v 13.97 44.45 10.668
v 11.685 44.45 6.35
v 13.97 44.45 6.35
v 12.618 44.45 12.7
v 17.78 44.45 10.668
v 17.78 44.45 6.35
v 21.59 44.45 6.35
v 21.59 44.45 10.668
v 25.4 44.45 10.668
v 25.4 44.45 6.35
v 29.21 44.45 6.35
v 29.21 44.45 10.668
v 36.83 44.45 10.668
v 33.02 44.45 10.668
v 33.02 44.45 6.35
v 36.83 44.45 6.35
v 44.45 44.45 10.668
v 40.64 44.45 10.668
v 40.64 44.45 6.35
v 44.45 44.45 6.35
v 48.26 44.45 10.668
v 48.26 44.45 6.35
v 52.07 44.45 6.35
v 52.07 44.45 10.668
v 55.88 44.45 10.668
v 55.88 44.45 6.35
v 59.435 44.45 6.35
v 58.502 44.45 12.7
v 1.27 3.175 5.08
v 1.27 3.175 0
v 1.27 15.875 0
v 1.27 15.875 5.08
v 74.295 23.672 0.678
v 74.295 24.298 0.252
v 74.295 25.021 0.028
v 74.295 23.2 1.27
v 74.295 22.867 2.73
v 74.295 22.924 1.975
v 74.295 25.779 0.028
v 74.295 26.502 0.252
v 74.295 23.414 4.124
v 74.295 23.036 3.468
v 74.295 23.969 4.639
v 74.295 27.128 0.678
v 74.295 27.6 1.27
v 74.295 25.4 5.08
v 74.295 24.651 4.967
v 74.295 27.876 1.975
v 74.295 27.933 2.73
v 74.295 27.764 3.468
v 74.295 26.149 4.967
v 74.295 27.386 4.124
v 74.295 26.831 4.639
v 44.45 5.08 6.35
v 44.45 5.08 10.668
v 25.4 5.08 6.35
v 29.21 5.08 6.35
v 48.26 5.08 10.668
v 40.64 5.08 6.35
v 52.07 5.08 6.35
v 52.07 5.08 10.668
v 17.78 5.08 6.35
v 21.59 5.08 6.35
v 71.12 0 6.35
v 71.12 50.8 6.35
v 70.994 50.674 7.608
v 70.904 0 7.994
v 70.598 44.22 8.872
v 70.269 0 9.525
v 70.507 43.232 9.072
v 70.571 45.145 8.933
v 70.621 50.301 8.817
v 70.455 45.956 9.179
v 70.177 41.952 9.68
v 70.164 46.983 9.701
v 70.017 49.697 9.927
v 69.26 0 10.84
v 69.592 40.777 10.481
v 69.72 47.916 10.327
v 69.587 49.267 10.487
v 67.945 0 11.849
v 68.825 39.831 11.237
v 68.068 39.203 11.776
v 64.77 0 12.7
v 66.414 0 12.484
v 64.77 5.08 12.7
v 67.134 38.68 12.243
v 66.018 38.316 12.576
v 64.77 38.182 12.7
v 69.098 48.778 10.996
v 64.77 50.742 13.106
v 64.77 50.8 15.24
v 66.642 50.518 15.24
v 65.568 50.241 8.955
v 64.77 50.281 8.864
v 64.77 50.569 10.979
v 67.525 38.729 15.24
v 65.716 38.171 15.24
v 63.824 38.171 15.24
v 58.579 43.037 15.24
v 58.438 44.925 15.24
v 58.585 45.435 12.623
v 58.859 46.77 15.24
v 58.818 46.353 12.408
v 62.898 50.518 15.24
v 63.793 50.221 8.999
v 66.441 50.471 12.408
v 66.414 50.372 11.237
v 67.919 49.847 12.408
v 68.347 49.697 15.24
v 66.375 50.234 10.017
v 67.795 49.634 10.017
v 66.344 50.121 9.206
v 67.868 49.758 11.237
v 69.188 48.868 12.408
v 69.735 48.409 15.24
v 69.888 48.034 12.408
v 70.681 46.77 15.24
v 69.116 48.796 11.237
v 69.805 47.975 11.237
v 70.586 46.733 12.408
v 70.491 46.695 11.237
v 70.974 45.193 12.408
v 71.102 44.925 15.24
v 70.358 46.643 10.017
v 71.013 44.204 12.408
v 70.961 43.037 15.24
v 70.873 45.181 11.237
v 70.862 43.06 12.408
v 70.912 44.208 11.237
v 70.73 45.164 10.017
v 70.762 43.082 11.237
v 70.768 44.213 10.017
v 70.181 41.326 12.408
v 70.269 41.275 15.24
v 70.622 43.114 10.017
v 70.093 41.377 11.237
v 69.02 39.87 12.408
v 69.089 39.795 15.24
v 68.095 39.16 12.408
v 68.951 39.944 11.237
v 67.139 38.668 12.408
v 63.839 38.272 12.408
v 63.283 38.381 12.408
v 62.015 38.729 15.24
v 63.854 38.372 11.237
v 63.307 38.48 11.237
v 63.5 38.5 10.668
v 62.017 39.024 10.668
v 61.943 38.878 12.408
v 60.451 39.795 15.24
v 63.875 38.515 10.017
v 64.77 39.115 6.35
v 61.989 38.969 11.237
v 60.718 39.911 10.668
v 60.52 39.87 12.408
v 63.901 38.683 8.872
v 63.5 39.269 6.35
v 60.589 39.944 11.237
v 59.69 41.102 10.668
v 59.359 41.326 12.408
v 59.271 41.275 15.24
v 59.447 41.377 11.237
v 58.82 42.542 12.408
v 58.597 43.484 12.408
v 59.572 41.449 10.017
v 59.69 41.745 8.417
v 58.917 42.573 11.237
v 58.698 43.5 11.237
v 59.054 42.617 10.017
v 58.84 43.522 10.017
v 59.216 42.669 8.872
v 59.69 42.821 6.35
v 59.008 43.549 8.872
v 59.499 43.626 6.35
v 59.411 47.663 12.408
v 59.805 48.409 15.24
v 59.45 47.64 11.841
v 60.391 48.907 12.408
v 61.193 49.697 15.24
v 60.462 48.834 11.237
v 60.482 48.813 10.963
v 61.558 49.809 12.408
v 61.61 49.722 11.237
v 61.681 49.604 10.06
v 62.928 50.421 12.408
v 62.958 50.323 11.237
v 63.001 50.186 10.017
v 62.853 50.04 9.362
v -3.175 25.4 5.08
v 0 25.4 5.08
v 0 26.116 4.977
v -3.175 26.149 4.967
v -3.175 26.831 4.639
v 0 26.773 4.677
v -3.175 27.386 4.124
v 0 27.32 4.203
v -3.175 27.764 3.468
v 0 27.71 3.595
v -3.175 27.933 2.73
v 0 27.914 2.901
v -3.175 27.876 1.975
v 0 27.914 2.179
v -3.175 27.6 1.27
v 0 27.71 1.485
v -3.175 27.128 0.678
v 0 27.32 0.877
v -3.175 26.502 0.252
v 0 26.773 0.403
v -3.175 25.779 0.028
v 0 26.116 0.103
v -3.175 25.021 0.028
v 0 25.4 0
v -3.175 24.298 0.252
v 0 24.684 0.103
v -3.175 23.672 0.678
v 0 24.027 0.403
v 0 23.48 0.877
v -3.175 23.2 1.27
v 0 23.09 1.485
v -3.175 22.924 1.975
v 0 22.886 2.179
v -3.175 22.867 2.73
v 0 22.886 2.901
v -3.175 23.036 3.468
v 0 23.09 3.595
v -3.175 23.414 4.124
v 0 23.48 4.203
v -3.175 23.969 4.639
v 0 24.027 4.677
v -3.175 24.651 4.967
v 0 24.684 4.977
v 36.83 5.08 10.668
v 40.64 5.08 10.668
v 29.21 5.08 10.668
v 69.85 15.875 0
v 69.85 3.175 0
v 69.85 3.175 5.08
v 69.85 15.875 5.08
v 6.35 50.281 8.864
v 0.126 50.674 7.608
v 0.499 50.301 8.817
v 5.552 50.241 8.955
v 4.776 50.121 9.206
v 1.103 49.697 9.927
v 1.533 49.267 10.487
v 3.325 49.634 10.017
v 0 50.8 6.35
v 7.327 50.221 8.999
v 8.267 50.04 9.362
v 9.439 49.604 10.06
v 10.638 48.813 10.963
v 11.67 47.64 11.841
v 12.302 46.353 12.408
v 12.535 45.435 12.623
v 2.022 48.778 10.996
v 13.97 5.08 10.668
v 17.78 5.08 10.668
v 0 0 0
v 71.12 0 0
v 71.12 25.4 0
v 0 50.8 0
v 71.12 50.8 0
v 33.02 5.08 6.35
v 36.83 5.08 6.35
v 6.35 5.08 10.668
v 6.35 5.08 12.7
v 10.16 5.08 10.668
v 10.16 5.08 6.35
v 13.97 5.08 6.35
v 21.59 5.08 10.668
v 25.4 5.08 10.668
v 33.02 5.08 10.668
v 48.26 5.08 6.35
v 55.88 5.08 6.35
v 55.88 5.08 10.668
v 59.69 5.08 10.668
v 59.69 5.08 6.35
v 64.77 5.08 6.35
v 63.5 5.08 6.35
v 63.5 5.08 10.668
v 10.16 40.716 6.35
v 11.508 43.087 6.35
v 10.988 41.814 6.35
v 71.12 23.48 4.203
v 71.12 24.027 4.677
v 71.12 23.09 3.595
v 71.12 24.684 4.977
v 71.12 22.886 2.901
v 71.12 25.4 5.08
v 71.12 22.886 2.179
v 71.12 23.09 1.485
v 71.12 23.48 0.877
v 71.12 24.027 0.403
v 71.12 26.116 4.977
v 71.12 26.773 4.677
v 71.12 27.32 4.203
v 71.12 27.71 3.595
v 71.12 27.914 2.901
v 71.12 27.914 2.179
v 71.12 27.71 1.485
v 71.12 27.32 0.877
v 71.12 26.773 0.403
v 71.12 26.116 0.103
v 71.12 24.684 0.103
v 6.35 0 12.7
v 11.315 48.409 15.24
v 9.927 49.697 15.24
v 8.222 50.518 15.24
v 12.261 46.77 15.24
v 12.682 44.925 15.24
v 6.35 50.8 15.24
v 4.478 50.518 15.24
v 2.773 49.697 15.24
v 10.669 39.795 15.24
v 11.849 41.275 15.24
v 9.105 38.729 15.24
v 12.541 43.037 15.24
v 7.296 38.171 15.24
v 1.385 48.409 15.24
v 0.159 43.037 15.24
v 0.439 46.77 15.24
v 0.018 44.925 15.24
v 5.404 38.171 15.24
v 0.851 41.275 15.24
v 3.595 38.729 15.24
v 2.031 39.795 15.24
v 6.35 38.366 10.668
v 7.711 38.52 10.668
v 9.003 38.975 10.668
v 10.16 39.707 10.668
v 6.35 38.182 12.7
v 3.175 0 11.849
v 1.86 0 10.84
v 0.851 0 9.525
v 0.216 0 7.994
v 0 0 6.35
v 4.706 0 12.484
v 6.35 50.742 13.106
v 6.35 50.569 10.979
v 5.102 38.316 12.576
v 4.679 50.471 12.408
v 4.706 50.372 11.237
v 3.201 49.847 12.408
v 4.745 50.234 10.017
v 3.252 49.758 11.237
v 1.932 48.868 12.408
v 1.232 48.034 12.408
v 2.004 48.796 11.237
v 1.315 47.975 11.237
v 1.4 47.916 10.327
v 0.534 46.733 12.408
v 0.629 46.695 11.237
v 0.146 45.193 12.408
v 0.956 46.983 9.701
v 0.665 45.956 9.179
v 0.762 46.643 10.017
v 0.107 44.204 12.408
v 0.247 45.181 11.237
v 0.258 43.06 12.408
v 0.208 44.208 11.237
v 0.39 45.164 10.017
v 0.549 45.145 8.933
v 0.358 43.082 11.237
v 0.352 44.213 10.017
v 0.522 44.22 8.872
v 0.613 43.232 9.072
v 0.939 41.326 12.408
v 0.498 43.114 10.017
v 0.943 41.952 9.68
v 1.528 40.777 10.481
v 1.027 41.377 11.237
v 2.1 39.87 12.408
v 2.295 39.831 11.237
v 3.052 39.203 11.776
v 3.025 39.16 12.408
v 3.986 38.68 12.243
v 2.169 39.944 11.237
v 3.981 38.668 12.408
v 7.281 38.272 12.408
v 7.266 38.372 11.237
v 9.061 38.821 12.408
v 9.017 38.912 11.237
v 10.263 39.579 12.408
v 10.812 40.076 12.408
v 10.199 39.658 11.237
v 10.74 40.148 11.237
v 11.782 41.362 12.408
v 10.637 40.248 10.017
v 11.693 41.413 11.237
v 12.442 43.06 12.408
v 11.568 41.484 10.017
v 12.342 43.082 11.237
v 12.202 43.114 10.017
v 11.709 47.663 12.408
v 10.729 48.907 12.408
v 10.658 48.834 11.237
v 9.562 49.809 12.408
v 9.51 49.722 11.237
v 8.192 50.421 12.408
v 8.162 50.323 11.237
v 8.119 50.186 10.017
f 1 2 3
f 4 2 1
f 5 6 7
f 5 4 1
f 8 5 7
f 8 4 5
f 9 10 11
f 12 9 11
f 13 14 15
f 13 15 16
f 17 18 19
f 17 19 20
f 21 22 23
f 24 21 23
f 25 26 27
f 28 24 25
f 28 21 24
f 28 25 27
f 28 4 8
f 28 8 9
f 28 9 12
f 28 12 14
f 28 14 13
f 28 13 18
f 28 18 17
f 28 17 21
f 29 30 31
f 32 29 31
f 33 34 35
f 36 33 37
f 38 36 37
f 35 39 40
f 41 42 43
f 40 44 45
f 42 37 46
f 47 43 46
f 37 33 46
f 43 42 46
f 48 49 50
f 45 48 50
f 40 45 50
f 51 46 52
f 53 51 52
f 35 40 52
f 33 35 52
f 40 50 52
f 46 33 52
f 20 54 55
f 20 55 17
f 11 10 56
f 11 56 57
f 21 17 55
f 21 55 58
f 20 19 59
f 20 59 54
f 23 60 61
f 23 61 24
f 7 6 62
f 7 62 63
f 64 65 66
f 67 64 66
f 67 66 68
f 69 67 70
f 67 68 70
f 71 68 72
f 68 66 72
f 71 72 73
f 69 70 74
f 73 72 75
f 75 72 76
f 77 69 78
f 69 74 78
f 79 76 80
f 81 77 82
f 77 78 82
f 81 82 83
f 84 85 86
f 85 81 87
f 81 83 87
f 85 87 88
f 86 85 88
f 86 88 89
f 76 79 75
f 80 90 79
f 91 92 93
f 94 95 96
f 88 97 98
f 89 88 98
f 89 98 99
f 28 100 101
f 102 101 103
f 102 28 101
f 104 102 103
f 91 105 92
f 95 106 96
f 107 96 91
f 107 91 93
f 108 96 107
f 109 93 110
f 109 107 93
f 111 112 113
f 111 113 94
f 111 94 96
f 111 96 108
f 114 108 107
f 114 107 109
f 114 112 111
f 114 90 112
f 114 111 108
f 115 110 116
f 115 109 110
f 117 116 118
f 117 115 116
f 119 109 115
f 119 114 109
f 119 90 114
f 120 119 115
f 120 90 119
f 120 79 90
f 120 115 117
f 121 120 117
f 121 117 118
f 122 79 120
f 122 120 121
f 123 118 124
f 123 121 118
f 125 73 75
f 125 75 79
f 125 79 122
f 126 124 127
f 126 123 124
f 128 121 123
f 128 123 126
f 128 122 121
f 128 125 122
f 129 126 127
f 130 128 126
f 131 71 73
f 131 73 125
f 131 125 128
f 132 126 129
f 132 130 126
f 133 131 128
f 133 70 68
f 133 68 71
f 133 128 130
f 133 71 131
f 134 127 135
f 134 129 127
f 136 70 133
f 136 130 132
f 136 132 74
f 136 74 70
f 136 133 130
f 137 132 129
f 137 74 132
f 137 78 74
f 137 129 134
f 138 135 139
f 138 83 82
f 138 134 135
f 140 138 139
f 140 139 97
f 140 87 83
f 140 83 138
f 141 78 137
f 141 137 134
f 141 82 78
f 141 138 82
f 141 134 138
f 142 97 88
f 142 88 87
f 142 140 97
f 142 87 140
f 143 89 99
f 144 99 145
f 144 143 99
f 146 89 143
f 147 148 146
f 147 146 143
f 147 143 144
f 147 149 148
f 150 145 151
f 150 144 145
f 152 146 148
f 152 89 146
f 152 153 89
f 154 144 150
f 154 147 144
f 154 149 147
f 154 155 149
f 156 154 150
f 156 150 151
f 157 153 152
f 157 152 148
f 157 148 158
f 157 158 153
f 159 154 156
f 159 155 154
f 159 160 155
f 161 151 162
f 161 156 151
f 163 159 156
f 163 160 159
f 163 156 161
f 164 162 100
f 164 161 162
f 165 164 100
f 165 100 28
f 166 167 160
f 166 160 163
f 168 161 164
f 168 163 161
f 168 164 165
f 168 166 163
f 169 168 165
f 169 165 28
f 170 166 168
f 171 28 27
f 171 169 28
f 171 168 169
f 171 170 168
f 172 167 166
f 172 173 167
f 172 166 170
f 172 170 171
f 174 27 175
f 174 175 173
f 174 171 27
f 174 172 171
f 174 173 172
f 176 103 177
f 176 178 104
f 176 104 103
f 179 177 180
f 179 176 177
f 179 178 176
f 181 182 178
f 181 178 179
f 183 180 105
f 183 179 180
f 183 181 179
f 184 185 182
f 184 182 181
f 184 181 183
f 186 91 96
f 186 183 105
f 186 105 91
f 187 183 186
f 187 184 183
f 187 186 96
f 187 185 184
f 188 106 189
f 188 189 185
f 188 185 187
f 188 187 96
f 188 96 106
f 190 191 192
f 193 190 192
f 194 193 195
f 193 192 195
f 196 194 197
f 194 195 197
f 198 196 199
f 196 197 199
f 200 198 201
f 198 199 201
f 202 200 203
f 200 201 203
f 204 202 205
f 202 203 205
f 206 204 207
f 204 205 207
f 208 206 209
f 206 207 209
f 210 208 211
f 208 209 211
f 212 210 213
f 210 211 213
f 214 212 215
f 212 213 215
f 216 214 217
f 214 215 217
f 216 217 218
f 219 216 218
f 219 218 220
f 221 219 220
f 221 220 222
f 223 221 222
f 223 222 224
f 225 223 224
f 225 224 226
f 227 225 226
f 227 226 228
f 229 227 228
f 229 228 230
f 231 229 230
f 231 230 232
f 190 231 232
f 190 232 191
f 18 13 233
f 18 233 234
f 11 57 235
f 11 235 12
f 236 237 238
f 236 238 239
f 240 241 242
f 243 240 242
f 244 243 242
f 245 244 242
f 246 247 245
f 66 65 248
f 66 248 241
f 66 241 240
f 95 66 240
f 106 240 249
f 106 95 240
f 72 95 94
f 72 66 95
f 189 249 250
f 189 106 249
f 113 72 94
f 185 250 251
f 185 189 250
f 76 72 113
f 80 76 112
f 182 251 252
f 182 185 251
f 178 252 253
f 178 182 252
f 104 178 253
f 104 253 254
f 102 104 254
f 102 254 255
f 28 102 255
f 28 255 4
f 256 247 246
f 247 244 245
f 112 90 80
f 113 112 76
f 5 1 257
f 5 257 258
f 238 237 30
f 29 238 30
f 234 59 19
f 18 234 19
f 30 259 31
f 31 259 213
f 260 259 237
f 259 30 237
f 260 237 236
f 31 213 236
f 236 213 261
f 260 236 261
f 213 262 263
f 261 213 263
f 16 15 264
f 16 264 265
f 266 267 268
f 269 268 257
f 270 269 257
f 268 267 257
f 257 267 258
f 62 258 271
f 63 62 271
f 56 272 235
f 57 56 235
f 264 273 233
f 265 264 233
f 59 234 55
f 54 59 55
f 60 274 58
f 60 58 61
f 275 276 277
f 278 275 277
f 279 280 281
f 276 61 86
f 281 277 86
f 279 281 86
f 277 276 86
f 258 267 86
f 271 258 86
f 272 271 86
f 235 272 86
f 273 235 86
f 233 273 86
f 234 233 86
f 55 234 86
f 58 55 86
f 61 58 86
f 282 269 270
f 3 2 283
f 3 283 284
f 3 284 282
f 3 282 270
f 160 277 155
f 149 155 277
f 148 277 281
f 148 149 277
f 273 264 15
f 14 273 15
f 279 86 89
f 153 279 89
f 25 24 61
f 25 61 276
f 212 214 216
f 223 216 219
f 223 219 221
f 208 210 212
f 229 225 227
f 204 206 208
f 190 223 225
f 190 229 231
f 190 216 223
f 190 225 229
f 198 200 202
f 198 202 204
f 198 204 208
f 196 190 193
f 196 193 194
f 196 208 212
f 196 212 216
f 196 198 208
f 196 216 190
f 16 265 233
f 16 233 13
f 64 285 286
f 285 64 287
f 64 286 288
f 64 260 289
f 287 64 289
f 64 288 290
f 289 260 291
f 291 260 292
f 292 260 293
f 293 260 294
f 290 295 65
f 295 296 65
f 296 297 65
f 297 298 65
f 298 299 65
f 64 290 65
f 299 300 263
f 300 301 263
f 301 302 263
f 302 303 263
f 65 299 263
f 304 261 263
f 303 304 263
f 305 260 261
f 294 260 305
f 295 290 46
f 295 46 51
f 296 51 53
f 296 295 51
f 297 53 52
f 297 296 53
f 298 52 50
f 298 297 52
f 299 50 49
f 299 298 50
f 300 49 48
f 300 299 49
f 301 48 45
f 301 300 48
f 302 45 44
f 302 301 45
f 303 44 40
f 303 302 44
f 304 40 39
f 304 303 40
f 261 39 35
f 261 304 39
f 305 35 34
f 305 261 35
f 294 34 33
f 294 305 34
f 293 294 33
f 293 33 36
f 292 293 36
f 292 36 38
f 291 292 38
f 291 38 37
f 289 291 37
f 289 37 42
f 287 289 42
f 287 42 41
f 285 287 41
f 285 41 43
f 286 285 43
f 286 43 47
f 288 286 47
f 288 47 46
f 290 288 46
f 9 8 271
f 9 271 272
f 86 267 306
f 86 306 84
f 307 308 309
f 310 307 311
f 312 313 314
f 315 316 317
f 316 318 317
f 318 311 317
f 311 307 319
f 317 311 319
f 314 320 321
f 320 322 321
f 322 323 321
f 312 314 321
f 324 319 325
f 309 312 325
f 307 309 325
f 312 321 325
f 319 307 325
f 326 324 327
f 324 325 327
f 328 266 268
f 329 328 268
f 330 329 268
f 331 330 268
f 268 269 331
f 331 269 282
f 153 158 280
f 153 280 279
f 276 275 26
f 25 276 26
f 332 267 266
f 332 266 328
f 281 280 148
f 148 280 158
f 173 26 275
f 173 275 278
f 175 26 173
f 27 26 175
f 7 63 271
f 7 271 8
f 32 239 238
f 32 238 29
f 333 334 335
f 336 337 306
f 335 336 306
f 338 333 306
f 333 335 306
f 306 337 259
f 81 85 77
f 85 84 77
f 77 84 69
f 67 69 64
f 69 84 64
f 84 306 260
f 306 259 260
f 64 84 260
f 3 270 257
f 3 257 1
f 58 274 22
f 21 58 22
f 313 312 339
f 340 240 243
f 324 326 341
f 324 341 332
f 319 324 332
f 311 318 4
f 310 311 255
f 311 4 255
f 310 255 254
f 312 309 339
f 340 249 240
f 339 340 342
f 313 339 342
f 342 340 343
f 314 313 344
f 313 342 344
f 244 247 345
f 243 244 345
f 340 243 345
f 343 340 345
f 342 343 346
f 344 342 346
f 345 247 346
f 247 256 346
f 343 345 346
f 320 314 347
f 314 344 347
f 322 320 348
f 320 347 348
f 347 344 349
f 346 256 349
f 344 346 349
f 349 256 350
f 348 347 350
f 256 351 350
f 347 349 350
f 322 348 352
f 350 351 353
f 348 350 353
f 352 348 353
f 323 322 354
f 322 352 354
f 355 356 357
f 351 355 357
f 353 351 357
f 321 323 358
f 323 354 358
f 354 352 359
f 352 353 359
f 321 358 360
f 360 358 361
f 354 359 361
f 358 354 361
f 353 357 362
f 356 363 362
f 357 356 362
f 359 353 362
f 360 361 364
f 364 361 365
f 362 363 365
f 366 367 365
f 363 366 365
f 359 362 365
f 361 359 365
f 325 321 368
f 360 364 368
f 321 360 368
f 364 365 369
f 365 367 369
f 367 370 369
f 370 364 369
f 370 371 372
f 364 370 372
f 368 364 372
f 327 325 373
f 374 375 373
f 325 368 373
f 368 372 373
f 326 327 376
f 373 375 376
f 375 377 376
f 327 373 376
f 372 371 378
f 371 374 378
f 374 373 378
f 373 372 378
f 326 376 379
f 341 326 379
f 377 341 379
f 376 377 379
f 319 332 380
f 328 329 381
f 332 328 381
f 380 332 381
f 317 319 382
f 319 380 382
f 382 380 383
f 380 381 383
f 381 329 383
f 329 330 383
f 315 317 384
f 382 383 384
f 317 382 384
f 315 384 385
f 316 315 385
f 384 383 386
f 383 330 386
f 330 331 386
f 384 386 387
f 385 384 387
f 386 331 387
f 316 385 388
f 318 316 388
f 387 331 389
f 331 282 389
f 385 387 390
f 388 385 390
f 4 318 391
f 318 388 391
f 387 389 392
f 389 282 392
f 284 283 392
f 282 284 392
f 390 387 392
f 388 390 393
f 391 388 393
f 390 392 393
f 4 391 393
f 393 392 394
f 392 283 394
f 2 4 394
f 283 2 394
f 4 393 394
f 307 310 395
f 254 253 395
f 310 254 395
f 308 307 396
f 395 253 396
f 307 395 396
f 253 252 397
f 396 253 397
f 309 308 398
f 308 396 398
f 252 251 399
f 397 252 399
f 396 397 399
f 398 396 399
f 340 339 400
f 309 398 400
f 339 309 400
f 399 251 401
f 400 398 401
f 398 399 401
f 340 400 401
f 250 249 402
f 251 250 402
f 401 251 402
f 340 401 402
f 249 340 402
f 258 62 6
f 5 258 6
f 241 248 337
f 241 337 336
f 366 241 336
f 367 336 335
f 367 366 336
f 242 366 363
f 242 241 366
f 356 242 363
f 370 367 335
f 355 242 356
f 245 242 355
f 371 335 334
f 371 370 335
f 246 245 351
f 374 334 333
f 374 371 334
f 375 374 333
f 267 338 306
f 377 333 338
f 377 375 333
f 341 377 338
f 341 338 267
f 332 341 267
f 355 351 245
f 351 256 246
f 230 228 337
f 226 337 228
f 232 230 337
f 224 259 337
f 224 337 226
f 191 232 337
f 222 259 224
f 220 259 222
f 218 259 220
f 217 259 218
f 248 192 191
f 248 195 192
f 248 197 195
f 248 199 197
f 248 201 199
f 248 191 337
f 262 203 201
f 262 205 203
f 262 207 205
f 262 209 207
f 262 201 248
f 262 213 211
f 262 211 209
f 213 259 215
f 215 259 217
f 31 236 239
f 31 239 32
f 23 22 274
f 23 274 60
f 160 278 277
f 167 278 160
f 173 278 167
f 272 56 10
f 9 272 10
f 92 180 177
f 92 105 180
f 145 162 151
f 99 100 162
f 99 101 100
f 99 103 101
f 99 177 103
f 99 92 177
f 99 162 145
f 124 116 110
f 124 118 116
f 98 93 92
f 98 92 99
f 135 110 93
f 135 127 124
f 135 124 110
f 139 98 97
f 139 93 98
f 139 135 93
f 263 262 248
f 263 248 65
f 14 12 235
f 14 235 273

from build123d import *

# Parameters (mm, degrees)
SKETCH2_W           = 71.12
SKETCH2_H           = 50.8
BOSS_EXTRUDE1_DEPTH = 12.7
FILLET2_R           = 6.35
SKETCH3_W           = 58.42
SKETCH3_H           = 39.37
CUT_EXTRUDE1_DEPTH  = 6.35
SKETCH4_W           = 3.81
SKETCH4_H           = 39.37
BOSS_EXTRUDE2_DEPTH = 4.318
LPATTERN1_COUNT     = 8
LPATTERN1_PITCH     = 7.62
SKETCH9_W           = 68.58
SKETCH9_H           = 12.7
CUT_EXTRUDE3_DEPTH  = 5.08
SKETCH10_R          = 2.54
BOSS_EXTRUDE3_DEPTH = 3.175
SKETCH8_W           = 30.144024865
SKETCH8_H           = 52.725935383
CUT_EXTRUDE2_DEPTH  = 83.82


with BuildPart() as part:
    # Sketch2 → Boss-Extrude1 (new body)
    with BuildSketch(Plane.XY):
        with Locations((35.56, 25.4)):
            Rectangle(SKETCH2_W, SKETCH2_H)
    extrude(amount=BOSS_EXTRUDE1_DEPTH)

    # Fillet2
    fillet2_edges = [part.edges().sort_by_distance(p)[0] for p in [
        (71.12, 25.4, 12.7),
        (35.56, 50.8, 12.7),
        (0, 25.4, 12.7),
    ]]
    fillet(fillet2_edges, radius=FILLET2_R)

    # Sketch3 → Cut-Extrude1 (cut)
    with BuildSketch(Plane.XY.offset(12.7)):
        with Locations((35.56, 24.765)):
            Rectangle(SKETCH3_W, SKETCH3_H)
    extrude(amount=-CUT_EXTRUDE1_DEPTH, mode=Mode.SUBTRACT)

    # Sketch4 → Boss-Extrude2 (add)
    with BuildSketch(Plane.XY.offset(6.35)):
        with Locations((8.255, 24.765)):
            Rectangle(SKETCH4_W, SKETCH4_H)
    boss_extrude2 = extrude(amount=BOSS_EXTRUDE2_DEPTH)

    # LPattern1: Boss-Extrude2 ×8
    with Locations(*[(i * LPATTERN1_PITCH, 0, 0) for i in range(1, LPATTERN1_COUNT)]):
        add(boss_extrude2)

    # Sketch7 → Revolve1 (revolve)
    with BuildSketch(Plane(origin=(6.35, 0, 0), x_dir=(0, 0, -1), z_dir=(1, 0, 0))):
        with BuildLine():
            Line((6.218866466, 44.45), (-15.24, 44.45))
            Line((-15.24, 44.45), (-15.24, 50.8))
            ThreePointArc((-15.24, 50.8), (-4.050658531, 49.179190459), (6.218866466, 44.45))
        make_face()
    revolve1 = revolve(axis=Axis((6.35, 44.45, -6.218866466), (0, 0, 1)))

    # Sketch9 → Cut-Extrude3 (cut)
    with BuildSketch(Plane(origin=(0, 0, 0), x_dir=(-1, 0, 0), z_dir=(0, 0, -1))):
        with Locations((-35.56, 9.525)):
            Rectangle(SKETCH9_W, SKETCH9_H)
    extrude(amount=-CUT_EXTRUDE3_DEPTH, mode=Mode.SUBTRACT)

    # Sketch10 → Boss-Extrude3 (add)
    with BuildSketch(Plane.ZY):
        with Locations((2.54, 25.4)):
            Circle(SKETCH10_R)
    boss_extrude3 = extrude(amount=BOSS_EXTRUDE3_DEPTH)

    # Mirror1: Revolve1, Boss-Extrude3 across plane
    add(revolve1.mirror(Plane(origin=(35.56, 0, 0), x_dir=(0, 0, 1), z_dir=(1, 0, 0))))
    add(boss_extrude3.mirror(Plane(origin=(35.56, 0, 0), x_dir=(0, 0, 1), z_dir=(1, 0, 0))))

    # Sketch8 → Cut-Extrude2 (cut)
    with BuildSketch(Plane.ZY):
        with Locations((-15.072012433, 24.437032309)):
            Rectangle(SKETCH8_W, SKETCH8_H)
    extrude(amount=-CUT_EXTRUDE2_DEPTH, mode=Mode.SUBTRACT)


solid = part.part
